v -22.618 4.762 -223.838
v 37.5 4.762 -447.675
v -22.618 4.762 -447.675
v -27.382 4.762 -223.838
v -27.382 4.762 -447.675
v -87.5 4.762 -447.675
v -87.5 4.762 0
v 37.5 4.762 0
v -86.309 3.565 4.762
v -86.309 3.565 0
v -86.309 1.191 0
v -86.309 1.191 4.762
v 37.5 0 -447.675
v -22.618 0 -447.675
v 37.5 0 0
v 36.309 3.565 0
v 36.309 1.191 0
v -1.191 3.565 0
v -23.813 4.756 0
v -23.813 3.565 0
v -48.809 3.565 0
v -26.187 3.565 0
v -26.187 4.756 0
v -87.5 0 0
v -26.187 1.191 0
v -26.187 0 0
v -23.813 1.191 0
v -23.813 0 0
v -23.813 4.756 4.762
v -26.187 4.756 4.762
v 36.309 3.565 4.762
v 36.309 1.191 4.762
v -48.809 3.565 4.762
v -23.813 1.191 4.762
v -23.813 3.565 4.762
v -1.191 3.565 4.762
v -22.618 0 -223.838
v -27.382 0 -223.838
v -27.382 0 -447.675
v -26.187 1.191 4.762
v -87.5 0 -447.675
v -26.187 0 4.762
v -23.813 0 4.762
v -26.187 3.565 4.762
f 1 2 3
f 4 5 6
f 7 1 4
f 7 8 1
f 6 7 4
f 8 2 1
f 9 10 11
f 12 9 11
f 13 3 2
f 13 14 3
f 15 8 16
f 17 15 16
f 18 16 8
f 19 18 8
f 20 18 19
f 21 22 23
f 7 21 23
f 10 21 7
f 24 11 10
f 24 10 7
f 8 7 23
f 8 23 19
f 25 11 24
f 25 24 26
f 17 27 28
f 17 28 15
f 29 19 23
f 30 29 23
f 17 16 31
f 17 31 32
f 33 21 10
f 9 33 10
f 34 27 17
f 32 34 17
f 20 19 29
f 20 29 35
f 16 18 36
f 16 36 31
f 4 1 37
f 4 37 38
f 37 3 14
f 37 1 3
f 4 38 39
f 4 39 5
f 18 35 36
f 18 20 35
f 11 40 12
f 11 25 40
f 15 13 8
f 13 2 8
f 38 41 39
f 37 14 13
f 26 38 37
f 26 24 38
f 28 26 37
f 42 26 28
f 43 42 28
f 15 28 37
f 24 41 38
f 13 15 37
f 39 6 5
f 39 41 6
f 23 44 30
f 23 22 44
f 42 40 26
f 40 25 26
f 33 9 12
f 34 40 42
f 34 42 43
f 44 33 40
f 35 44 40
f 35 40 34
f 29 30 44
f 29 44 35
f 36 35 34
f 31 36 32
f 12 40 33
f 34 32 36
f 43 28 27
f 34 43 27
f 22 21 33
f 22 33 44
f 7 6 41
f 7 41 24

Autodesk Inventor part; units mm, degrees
ref_plane "YZ Plane" through (0, 0, 0) normal (1, 0, 0) x (0, 1, 0)
ref_plane "XZ Plane" through (0, 0, 0) normal (0, 1, 0) x (-1, 0, 0)
ref_plane "XY Plane" through (0, 0, 0) normal (0, 0, 1) x (1, 0, 0)
sketch "Sketch1" plane through (0, 0, 0) normal (0, 1, 0) x (-1, 0, 0)
  line L0 (0, 0) -> (50, 0)
  line L1 (50, 0) -> (50, -447.675)
  line L2 (50, -447.675) -> (0, -447.675)
  line L3 (0, -447.675) -> (0, 0)
  dimension "d0" = 50
  dimension "d1" = 447.675
extrude "Extrusion1" add sketch "Sketch1" along normal blind 4.7625
sketch "Sketch2" plane through (-50, 0, 0) normal (0, 0, 1) x (1, 0, 0)
  line L0 (1.1907, 3.5648) -> (1.1907, 1.1907)
  line L1 (50, 0) -> (0, 0) projected
  line L2 (50, 4.7625) -> (0, 4.7625) projected
  line L3 (1.1907, 1.1907) -> (48.8093, 1.1907)
  line L4 (1.1907, 3.5648) -> (48.8093, 3.5648)
  line L5 (48.8093, 3.5648) -> (48.8093, 1.1907)
  line L6 (50, 0) -> (50, 4.7625) projected
extrude "Extrusion2" add sketch "Sketch2" along normal blind 4.7625
sketch "Sketch3" plane through (0, 4.7625, 0) normal (0, 1, 0) x (1, 0, 0)
  line L0 (0, 0) -> (-25, 0)
  line L1 (-1.1907, 0) -> (-48.8093, 0) projected
  line L2 (-25, 65) -> (-19, 65)
  line L3 (-19, 65) -> (-25, 65)
  line L4 (-25, 65) -> (-31, 65)
  line L5 (-31, 65) -> (-31, 447.675)
  line L6 (0, 447.675) -> (-50, 447.675) projected
  line L7 (-19, 65) -> (-19, 447.675)
  line L8 (-19, 447.675) -> (-31, 447.675)
  dimension "d11" = 25
  dimension "d13" = 6
  dimension "d14" = 6
extrude "Extrusion3" cut sketch "Sketch3" against normal blind 10
sketch "Sketch4" plane through (-19, 4.7625, -65) normal (0, 0, -1) x (-1, 0, 0)
  line L0 (12, -4.7625) -> (0, -4.7625) projected
  line L1 (12, 0) -> (12, -4.7625) projected
  line L2 (0, 0) -> (12, 0) projected
  line L3 (0, 0) -> (0, -4.7625) projected
  point P0 (-19, -4.7625)
extrude "Extrusion4" add sketch "Sketch4" along normal blind 158.838
sketch "Sketch7" plane through (-19, 4.7625, -223.838) normal (0, 0, -1) x (-1, 0, 0)
  line L0 (0, -4.7625) -> (0, 0) projected
  line L1 (3.6185, 0) -> (3.6185, -4.7625)
  line L2 (3.6185, -4.7625) -> (8.3815, -4.7625)
  line L3 (8.3815, -4.7625) -> (8.3815, 0)
  line L4 (3.6185, 0) -> (8.3815, 0)
  line L5 (12, 0) -> (0, 0) projected
  line L6 (0, 0) -> (3.6185, 0)
  line L7 (0, -4.7625) -> (12, -4.7625) projected
  line L8 (3.6185, -4.7625) -> (0, -4.7625)
  line L9 (0, -4.7625) -> (0, 0)
  line L10 (8.3815, 0) -> (12, 0)
  line L11 (12, 0) -> (12, -4.7625) projected
  line L12 (12, 0) -> (12, -4.7625)
  line L13 (12, -4.7625) -> (8.3815, -4.7625)
  point P0 (-19, -4.7625)
  dimension "d20" = 4.763
extrude "Extrusion5" add sketch "Sketch7" along normal blind 223.837 contours L0 L5 L1 L7 | L3 L5 L11 L7
sketch "Sketch8" plane through (-50, 0, 0) normal (0, 0, 1) x (1, 0, 0)
  line L0 (26.187, 0) -> (26.187, 1.1907)
  line L1 (26.187, 1.1907) -> (23.813, 1.1907)
  line L2 (23.813, 1.1907) -> (23.813, 0)
  line L3 (26.187, 0) -> (23.813, 0)
  line L4 (23.813, 1.1907) -> (26.187, 1.1907)
  line L5 (1.1907, 1.1907) -> (1.1907, 3.5648) projected
  line L6 (1.1907, 2.3778) -> (48.8093, 2.3778)
  line L7 (48.8093, 1.1907) -> (1.1907, 1.1907) projected
  line L8 (26.187, 4.7555) -> (26.187, 3.5648)
  line L9 (26.187, 3.5648) -> (23.813, 3.5648)
  line L10 (23.813, 3.5648) -> (23.813, 4.7555)
  line L11 (26.187, 4.7555) -> (23.813, 4.7555)
  point P0 (0, 0)
  dimension "d25" = 2.374
extrude "Extrusion6" add sketch "Sketch8" along normal up to surface (4.7625 mm away)
sketch "Sketch9" plane through (0, 4.7625, 0) normal (0, 1, 0) x (1, 0, 0)
  line L0 (0, 0) -> (25, 0)
  line L1 (0, 447.675) -> (-22.6185, 447.675) projected
  line L2 (0, 447.675) -> (25, 447.675)
  line L3 (25, 447.675) -> (25, 0)
  line L4 (0, 0) -> (0, 447.675) projected
  line L5 (0, 0) -> (0, 447.675)
  line L6 (-50, 0) -> (0, 0) projected
  line L7 (-50, 0) -> (-75, 0)
  line L8 (-50, 447.675) -> (-75, 447.675)
  line L9 (-75, 447.675) -> (-75, 0)
  line L10 (-50, 0) -> (-50, 447.675)
  dimension "d28" = 25
extrude "Extrusion7" add sketch "Sketch9" against normal up to surface (4.7625 mm away)
sketch "Sketch10" plane through (0, 4.7625, 0) normal (0, 1, 0) x (1, 0, 0)
  line L0 (25, 0) -> (25, 447.675) projected
  line L1 (25, 0) -> (37.5, 0)
  line L2 (25, 447.675) -> (37.5, 447.675)
  line L3 (37.5, 447.675) -> (37.5, 0)
  line L4 (-75, 0) -> (25, 0) projected
  line L5 (25, 447.675) -> (-22.6185, 447.675) projected
  line L6 (25, 447.675) -> (25, 0)
  line L7 (-75, 0) -> (-75, 447.675)
  line L8 (-75, 0) -> (-87.5, 0)
  line L9 (-75, 447.675) -> (-87.5, 447.675)
  line L10 (-87.5, 447.675) -> (-87.5, 0)
  point P0 (0, 0)
  dimension "d31" = 12.5
extrude "Extrusion8" add sketch "Sketch10" against normal up to surface (4.7625 mm away)
sketch "Sketch11" plane through (-48.8093, 1.1907, 0) normal (0, 0, 1) x (1, 0, 0)
  line L0 (47.6185, 0) -> (24.9963, 0) projected
  line L1 (47.6185, 0) -> (85.1183, 0)
  line L2 (24.9963, 2.374) -> (47.6185, 2.374) projected
  line L3 (47.6185, 2.374) -> (85.1183, 2.374)
  line L4 (85.1183, 2.374) -> (85.1183, 0)
  line L5 (24.9963, -1.1907) -> (22.6223, -1.1907) projected
  line L6 (23.8093, -1.1907) -> (23.8093, 3.5648)
  line L7 (22.6223, 3.5648) -> (24.9963, 3.5648) projected
  line L8 (47.6185, 2.374) -> (47.6185, 0) projected
  line L9 (47.6185, 2.374) -> (47.6185, 0)
  line L10 (0, 0) -> (-37.4998, 0)
  line L11 (0, 2.374) -> (-37.4998, 2.374)
  line L12 (-37.4998, 2.374) -> (-37.4998, 0)
  line L13 (0, 2.374) -> (0, 0)
  point P0 (48.8093, -1.1907)
extrude "Extrusion9" add sketch "Sketch11" along normal up to surface (4.7625 mm away)
properties part number "Sustainable Chair_V1 - Leg" material "Foam Board - V3"
